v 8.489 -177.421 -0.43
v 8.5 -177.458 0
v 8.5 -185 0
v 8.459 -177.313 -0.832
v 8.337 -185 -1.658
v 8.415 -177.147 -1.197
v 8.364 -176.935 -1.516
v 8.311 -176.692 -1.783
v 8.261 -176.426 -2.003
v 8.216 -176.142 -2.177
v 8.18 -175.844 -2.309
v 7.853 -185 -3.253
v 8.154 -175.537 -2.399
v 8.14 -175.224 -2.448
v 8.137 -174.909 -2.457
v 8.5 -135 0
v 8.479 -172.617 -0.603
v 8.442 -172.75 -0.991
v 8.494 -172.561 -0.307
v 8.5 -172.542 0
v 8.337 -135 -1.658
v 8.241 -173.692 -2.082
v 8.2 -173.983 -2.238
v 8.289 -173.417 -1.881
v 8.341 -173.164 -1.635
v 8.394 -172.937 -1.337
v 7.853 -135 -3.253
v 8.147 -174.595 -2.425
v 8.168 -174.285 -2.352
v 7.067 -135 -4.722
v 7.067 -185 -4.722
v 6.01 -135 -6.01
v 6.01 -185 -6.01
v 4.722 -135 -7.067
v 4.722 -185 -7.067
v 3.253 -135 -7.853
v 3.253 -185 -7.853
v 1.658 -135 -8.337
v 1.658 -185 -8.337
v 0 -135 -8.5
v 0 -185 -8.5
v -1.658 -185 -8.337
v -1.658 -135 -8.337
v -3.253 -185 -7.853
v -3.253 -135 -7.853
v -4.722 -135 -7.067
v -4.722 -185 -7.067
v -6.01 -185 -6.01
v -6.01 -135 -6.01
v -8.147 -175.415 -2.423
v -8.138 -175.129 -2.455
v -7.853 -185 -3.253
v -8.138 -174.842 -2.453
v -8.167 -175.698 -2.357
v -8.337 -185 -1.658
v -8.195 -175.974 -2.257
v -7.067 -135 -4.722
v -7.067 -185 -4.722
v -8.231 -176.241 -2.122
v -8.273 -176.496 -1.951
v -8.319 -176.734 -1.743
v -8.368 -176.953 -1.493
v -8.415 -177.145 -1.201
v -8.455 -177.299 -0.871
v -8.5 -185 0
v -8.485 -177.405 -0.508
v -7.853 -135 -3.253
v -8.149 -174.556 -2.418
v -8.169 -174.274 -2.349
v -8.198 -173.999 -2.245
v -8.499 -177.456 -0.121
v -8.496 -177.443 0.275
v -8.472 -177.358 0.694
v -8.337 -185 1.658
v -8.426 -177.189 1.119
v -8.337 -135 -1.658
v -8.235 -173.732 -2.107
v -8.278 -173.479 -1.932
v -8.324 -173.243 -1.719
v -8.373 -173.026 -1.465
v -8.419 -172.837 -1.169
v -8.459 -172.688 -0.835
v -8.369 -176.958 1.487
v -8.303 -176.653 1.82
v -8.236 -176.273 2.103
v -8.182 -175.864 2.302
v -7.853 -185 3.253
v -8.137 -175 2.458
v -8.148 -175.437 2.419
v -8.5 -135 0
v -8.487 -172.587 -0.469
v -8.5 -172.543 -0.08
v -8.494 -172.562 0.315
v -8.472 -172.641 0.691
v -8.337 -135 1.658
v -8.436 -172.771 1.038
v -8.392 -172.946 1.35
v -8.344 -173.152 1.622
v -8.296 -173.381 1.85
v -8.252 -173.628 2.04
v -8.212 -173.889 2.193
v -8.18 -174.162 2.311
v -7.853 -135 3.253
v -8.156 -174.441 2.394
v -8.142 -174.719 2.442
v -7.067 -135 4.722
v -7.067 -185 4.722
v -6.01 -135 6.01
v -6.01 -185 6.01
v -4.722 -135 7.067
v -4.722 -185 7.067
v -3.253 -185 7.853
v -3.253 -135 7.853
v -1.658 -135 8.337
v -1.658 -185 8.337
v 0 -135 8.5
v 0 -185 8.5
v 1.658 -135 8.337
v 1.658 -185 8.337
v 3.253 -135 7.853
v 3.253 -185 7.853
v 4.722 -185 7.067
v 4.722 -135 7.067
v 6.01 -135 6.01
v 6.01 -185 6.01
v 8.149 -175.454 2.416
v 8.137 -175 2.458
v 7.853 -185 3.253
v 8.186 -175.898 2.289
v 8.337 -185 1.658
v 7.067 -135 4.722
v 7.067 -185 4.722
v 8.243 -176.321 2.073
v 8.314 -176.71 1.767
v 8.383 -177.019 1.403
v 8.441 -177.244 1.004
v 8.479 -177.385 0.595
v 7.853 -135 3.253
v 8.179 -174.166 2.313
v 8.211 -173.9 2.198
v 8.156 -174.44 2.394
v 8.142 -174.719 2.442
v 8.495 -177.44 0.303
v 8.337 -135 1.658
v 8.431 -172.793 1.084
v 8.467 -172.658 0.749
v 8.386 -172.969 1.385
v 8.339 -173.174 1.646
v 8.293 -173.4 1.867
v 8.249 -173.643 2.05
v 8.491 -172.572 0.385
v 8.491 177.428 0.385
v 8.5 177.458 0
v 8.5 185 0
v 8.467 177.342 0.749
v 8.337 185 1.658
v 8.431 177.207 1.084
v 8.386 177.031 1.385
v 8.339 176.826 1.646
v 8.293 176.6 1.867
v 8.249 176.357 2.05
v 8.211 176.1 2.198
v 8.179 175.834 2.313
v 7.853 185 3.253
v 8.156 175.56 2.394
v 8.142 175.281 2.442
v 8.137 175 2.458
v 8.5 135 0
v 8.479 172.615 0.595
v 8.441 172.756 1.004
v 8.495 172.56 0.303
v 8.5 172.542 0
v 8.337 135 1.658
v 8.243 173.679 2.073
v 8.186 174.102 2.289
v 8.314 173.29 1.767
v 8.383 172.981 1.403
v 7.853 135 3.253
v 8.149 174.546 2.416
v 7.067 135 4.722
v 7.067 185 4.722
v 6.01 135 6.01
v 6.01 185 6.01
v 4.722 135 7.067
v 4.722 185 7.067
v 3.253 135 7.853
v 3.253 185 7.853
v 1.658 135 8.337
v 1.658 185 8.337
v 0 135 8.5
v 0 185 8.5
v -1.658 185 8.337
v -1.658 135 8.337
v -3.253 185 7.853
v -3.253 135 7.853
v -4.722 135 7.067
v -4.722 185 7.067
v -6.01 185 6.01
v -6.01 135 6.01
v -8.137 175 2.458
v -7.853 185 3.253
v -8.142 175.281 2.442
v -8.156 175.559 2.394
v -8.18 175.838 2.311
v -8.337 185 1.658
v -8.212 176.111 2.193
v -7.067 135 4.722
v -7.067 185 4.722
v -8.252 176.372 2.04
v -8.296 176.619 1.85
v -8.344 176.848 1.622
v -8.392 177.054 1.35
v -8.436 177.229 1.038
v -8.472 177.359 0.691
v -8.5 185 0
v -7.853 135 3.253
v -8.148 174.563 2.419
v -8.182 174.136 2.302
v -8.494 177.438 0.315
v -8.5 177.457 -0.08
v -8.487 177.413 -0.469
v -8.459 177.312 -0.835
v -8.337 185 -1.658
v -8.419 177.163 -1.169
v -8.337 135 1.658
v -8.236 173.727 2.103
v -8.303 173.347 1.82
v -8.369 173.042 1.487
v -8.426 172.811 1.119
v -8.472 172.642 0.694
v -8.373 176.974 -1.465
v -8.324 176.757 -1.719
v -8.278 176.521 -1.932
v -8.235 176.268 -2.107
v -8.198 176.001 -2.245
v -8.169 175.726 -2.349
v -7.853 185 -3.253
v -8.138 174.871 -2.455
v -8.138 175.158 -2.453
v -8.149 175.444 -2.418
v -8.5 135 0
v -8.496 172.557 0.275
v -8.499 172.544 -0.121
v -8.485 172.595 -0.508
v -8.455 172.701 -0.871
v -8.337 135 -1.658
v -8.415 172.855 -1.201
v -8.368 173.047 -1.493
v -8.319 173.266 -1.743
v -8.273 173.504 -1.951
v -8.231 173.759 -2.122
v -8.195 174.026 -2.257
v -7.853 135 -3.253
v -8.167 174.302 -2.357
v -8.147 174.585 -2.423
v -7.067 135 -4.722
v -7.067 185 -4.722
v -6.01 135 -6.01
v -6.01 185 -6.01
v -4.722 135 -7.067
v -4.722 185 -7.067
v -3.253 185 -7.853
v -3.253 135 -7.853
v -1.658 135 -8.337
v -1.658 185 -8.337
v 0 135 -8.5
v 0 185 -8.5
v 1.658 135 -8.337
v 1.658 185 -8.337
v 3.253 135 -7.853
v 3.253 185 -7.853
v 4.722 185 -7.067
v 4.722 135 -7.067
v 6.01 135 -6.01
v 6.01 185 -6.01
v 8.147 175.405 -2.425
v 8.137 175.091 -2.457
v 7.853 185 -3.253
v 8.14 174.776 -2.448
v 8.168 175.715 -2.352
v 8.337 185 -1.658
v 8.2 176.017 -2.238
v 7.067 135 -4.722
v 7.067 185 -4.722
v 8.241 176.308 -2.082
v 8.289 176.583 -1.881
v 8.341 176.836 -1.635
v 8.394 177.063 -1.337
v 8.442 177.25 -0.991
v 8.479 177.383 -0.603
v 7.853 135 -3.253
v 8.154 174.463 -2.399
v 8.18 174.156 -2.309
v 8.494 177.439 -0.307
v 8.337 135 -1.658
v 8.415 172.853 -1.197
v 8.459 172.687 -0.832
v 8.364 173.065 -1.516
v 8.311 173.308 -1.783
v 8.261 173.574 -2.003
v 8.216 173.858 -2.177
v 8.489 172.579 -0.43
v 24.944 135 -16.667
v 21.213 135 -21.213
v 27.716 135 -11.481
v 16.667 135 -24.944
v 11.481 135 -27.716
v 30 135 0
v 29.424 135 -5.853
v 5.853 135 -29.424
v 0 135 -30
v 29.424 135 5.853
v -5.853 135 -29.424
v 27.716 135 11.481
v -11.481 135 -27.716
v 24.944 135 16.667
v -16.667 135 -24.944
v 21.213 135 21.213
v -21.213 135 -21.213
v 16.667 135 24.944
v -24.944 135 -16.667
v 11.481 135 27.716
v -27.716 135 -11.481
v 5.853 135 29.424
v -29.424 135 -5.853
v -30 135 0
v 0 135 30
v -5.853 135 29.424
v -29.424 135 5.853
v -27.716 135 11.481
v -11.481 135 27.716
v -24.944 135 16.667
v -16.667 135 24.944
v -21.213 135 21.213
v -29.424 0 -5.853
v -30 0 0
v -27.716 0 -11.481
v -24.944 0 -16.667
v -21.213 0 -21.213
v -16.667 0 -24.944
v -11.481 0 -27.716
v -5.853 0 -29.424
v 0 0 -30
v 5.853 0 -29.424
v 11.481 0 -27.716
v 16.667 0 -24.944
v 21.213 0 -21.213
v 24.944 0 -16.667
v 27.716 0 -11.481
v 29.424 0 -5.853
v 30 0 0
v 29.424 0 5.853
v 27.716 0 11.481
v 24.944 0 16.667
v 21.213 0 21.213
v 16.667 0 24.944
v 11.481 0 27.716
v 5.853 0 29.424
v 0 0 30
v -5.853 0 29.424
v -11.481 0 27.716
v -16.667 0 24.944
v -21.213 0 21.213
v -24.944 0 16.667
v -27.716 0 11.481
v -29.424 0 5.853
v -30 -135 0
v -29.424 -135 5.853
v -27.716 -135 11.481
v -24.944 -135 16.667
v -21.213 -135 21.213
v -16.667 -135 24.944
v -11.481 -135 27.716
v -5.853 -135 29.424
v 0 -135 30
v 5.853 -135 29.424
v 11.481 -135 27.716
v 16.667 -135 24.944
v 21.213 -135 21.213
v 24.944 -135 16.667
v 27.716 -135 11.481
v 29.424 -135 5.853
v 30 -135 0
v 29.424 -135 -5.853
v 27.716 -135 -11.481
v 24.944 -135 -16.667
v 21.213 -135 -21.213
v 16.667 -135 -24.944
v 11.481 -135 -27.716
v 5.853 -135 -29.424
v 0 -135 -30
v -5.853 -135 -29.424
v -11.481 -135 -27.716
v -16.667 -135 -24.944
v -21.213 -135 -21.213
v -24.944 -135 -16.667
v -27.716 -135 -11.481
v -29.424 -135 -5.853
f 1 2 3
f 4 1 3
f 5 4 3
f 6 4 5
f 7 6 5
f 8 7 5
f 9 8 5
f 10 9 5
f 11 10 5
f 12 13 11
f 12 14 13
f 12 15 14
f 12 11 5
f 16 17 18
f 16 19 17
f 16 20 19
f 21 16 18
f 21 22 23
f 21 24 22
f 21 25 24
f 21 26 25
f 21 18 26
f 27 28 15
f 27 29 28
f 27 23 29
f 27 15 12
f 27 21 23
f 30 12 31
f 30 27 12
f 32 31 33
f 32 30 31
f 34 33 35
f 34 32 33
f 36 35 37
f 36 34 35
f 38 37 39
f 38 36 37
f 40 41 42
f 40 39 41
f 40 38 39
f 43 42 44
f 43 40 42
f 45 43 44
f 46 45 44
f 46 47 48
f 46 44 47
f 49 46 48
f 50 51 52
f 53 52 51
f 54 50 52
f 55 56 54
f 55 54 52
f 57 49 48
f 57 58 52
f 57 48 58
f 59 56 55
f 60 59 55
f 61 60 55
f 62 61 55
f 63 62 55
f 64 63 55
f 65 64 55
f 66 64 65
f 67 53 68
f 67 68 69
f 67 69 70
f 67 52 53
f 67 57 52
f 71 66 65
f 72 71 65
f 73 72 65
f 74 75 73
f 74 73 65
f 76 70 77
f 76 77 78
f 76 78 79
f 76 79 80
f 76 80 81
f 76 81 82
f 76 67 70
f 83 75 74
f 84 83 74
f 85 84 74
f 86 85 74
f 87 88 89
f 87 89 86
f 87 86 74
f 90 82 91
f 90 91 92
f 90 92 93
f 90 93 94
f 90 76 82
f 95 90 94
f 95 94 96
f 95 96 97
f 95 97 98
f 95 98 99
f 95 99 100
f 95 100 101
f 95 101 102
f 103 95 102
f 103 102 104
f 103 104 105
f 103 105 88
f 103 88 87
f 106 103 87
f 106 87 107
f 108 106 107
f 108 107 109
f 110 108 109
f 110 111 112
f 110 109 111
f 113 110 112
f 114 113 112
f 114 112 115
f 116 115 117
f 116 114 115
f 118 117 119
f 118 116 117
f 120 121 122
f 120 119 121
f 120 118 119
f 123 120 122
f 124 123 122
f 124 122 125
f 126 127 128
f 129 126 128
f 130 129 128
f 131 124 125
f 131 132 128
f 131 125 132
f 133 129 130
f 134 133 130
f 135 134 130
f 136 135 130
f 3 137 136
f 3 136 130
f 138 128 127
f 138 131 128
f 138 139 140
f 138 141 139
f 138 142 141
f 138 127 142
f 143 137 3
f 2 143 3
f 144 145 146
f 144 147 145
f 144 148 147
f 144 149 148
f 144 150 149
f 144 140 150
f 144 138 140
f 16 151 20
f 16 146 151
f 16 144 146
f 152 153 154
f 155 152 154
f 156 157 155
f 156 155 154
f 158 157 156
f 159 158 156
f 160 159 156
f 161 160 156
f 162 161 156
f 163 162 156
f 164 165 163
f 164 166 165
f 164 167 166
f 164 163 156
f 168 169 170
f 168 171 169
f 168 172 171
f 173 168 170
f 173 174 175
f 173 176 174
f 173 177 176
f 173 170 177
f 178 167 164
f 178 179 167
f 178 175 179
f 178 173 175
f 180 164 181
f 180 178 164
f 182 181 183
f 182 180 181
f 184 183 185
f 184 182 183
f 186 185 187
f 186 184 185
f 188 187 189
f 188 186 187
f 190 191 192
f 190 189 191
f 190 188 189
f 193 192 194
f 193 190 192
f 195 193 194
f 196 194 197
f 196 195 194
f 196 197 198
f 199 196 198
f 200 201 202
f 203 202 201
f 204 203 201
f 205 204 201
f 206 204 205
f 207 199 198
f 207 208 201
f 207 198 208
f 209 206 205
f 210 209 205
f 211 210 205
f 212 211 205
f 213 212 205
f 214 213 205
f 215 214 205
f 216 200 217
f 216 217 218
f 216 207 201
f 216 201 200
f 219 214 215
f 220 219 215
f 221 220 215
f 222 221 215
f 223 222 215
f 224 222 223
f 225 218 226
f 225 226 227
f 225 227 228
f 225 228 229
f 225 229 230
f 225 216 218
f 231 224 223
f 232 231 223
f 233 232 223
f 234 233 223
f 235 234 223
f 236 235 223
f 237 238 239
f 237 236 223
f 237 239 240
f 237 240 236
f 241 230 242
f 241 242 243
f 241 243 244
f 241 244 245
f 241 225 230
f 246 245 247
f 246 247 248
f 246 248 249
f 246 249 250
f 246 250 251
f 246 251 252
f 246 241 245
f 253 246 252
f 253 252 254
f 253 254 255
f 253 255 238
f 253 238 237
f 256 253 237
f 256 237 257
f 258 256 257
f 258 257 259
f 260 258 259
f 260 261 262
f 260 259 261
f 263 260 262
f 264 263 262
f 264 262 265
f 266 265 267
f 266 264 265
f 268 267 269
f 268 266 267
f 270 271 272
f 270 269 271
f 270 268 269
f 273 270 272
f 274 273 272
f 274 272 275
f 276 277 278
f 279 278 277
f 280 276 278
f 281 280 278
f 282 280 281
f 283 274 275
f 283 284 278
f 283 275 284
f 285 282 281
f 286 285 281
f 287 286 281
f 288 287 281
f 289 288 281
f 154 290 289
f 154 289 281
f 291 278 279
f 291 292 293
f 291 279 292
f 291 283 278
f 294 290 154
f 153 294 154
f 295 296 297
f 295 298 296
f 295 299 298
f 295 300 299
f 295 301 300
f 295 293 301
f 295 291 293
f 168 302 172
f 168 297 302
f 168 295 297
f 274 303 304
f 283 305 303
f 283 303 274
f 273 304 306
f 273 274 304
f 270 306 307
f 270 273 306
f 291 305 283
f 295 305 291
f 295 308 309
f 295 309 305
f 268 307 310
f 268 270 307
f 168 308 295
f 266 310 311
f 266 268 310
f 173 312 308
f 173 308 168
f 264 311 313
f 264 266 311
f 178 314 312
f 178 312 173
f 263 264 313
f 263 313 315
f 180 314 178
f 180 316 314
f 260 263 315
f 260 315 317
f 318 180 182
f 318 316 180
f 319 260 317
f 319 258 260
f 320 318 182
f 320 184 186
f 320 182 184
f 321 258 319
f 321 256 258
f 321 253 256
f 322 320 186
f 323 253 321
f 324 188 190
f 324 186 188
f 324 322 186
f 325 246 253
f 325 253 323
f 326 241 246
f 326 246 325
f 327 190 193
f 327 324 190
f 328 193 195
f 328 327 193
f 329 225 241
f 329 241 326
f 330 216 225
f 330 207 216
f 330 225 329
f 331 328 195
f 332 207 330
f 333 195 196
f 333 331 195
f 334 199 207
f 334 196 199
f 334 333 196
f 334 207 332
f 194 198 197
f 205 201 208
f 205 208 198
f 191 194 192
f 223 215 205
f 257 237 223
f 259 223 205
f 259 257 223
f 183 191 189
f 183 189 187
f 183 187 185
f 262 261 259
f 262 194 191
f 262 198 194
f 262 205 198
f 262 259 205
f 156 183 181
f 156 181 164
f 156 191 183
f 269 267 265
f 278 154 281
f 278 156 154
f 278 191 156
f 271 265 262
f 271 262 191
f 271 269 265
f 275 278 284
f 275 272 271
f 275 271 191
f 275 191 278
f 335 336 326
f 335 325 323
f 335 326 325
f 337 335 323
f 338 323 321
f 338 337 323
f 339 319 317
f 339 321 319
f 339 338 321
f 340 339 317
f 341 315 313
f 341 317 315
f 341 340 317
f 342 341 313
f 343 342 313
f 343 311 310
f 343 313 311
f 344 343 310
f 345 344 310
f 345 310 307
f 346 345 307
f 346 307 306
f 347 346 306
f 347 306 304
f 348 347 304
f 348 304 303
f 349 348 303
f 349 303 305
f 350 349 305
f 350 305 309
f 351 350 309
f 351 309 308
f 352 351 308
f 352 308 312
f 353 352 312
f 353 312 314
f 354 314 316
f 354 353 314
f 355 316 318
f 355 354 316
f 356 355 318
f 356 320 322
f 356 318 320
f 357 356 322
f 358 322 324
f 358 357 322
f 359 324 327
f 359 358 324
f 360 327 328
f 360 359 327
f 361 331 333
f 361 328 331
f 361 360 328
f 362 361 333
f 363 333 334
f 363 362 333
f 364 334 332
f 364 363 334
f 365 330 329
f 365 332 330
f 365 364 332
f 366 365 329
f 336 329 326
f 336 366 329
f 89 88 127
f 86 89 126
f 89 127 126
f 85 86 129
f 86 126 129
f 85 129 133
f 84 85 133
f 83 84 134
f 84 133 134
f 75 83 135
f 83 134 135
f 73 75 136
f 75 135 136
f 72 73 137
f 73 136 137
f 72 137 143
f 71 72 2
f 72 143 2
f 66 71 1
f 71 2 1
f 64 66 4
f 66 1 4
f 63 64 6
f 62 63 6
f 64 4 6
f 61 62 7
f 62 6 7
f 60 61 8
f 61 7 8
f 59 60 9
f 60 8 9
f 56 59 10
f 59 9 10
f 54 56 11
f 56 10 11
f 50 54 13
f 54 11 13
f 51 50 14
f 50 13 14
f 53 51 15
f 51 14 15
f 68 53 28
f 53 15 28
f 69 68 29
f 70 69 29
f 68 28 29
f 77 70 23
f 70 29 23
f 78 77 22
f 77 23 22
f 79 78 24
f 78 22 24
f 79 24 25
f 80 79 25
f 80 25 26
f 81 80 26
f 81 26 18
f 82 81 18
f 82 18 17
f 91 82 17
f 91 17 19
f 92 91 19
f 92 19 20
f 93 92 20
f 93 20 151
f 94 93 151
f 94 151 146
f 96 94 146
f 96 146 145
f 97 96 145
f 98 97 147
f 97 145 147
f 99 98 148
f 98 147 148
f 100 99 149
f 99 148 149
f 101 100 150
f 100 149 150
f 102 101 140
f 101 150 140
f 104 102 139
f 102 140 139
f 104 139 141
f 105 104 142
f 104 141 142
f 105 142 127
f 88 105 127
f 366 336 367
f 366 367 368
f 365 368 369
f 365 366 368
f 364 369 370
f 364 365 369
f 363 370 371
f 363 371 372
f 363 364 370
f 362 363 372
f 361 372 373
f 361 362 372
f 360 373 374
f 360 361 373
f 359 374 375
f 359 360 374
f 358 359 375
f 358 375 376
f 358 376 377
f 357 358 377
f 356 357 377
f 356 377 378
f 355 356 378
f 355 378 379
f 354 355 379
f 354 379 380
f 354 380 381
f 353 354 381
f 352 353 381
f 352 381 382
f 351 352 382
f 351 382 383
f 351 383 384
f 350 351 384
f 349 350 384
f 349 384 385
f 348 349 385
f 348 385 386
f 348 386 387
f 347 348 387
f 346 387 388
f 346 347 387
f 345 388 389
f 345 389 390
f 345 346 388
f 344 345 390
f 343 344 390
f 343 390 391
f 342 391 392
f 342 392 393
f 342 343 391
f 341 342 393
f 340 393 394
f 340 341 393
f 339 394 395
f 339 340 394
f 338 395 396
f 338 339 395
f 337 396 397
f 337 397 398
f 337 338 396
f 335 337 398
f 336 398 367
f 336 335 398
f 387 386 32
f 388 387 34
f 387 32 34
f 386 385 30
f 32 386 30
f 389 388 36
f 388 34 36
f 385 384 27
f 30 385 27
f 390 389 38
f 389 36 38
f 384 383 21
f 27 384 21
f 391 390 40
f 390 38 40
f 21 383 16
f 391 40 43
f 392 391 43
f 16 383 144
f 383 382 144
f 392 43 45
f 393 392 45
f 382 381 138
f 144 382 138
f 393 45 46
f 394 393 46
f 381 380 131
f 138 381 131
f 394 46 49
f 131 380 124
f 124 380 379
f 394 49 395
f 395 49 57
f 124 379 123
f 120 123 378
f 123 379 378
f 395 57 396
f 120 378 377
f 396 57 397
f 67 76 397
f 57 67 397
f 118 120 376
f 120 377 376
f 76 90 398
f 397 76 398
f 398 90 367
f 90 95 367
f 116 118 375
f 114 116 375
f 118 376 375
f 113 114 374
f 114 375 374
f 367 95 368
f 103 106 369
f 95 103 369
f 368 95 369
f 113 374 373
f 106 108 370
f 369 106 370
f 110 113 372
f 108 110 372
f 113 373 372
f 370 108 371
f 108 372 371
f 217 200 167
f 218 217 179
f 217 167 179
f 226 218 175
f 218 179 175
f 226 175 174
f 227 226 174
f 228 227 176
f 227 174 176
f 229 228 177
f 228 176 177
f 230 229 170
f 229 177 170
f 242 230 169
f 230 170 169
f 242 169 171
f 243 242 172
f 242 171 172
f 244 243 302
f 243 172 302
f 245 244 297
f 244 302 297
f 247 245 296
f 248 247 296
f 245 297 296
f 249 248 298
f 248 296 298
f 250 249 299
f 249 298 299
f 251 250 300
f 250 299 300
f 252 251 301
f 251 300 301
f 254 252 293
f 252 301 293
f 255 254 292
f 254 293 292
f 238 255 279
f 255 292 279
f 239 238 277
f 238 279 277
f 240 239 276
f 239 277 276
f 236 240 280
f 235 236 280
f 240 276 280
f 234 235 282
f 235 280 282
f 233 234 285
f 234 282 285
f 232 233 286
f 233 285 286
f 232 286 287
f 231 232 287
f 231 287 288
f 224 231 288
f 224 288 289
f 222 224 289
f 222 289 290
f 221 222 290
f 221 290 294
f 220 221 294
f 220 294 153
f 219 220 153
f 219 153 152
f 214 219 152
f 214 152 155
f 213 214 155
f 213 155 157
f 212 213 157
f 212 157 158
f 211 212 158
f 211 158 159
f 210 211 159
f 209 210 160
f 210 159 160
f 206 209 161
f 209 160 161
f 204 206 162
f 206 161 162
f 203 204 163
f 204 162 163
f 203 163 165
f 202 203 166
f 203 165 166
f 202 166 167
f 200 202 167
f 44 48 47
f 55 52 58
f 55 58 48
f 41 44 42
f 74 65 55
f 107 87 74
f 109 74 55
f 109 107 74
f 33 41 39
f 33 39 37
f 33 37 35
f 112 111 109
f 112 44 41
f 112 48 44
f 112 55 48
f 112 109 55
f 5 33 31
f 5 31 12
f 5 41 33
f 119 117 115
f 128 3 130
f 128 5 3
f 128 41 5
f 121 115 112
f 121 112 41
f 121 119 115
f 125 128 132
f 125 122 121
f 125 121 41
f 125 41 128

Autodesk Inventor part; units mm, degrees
ref_plane "YZ Plane" through (0, 0, 0) normal (1, 0, 0) x (0, 1, 0)
ref_plane "XZ Plane" through (0, 0, 0) normal (0, 1, 0) x (-1, 0, 0)
sketch "Sketch1" plane through (0, 0, 0) normal (0, 1, 0) x (-1, 0, 0)
  circle A0 centre (0, 0) radius 30
  dimension "d0" = 60
extrude "Extrusion1" add sketch "Sketch1" along normal mid plane 270
sketch "Sketch2" plane through (0, -135, 0) normal (0, -1, 0) x (1, 0, 0)
  circle A0 centre (0, 0) radius 8.5
  dimension "d3" = 17
extrude "Extrusion2" add sketch "Sketch2" along normal blind 50
sketch "Sketch3" plane through (0, 135, 0) normal (0, 1, 0) x (1, 0, 0)
  circle A0 centre (0, 0) radius 8.5 projected
  circle A1 centre (0, 0) radius 8.5
  dimension "d6" = 17
extrude "Extrusion3" add sketch "Sketch3" along normal blind 50
ref_plane "Work Plane1" through (-9, 135, 0) normal (-1, 0, 0) x (0, 1, 0)
sketch "Sketch4" plane through (-9, 135, 0) normal (-1, 0, 0) x (0, 1, 0)
  circle A0 centre (40, 0) radius 4 projected
  circle A1 centre (-310, 0) radius 4 projected
  point P0 (-135, 0)
hole "Hole1" at (-9, 175, 0) at (-9, -175, 0) direction (1, 0, 0) diameter 4.917 end through all thread size "M6x1" class "6H" standard "ISO Metric profile"
properties part number "HCMUTE-CDT23-TRUC_CANG" material "Stainless Steel"
